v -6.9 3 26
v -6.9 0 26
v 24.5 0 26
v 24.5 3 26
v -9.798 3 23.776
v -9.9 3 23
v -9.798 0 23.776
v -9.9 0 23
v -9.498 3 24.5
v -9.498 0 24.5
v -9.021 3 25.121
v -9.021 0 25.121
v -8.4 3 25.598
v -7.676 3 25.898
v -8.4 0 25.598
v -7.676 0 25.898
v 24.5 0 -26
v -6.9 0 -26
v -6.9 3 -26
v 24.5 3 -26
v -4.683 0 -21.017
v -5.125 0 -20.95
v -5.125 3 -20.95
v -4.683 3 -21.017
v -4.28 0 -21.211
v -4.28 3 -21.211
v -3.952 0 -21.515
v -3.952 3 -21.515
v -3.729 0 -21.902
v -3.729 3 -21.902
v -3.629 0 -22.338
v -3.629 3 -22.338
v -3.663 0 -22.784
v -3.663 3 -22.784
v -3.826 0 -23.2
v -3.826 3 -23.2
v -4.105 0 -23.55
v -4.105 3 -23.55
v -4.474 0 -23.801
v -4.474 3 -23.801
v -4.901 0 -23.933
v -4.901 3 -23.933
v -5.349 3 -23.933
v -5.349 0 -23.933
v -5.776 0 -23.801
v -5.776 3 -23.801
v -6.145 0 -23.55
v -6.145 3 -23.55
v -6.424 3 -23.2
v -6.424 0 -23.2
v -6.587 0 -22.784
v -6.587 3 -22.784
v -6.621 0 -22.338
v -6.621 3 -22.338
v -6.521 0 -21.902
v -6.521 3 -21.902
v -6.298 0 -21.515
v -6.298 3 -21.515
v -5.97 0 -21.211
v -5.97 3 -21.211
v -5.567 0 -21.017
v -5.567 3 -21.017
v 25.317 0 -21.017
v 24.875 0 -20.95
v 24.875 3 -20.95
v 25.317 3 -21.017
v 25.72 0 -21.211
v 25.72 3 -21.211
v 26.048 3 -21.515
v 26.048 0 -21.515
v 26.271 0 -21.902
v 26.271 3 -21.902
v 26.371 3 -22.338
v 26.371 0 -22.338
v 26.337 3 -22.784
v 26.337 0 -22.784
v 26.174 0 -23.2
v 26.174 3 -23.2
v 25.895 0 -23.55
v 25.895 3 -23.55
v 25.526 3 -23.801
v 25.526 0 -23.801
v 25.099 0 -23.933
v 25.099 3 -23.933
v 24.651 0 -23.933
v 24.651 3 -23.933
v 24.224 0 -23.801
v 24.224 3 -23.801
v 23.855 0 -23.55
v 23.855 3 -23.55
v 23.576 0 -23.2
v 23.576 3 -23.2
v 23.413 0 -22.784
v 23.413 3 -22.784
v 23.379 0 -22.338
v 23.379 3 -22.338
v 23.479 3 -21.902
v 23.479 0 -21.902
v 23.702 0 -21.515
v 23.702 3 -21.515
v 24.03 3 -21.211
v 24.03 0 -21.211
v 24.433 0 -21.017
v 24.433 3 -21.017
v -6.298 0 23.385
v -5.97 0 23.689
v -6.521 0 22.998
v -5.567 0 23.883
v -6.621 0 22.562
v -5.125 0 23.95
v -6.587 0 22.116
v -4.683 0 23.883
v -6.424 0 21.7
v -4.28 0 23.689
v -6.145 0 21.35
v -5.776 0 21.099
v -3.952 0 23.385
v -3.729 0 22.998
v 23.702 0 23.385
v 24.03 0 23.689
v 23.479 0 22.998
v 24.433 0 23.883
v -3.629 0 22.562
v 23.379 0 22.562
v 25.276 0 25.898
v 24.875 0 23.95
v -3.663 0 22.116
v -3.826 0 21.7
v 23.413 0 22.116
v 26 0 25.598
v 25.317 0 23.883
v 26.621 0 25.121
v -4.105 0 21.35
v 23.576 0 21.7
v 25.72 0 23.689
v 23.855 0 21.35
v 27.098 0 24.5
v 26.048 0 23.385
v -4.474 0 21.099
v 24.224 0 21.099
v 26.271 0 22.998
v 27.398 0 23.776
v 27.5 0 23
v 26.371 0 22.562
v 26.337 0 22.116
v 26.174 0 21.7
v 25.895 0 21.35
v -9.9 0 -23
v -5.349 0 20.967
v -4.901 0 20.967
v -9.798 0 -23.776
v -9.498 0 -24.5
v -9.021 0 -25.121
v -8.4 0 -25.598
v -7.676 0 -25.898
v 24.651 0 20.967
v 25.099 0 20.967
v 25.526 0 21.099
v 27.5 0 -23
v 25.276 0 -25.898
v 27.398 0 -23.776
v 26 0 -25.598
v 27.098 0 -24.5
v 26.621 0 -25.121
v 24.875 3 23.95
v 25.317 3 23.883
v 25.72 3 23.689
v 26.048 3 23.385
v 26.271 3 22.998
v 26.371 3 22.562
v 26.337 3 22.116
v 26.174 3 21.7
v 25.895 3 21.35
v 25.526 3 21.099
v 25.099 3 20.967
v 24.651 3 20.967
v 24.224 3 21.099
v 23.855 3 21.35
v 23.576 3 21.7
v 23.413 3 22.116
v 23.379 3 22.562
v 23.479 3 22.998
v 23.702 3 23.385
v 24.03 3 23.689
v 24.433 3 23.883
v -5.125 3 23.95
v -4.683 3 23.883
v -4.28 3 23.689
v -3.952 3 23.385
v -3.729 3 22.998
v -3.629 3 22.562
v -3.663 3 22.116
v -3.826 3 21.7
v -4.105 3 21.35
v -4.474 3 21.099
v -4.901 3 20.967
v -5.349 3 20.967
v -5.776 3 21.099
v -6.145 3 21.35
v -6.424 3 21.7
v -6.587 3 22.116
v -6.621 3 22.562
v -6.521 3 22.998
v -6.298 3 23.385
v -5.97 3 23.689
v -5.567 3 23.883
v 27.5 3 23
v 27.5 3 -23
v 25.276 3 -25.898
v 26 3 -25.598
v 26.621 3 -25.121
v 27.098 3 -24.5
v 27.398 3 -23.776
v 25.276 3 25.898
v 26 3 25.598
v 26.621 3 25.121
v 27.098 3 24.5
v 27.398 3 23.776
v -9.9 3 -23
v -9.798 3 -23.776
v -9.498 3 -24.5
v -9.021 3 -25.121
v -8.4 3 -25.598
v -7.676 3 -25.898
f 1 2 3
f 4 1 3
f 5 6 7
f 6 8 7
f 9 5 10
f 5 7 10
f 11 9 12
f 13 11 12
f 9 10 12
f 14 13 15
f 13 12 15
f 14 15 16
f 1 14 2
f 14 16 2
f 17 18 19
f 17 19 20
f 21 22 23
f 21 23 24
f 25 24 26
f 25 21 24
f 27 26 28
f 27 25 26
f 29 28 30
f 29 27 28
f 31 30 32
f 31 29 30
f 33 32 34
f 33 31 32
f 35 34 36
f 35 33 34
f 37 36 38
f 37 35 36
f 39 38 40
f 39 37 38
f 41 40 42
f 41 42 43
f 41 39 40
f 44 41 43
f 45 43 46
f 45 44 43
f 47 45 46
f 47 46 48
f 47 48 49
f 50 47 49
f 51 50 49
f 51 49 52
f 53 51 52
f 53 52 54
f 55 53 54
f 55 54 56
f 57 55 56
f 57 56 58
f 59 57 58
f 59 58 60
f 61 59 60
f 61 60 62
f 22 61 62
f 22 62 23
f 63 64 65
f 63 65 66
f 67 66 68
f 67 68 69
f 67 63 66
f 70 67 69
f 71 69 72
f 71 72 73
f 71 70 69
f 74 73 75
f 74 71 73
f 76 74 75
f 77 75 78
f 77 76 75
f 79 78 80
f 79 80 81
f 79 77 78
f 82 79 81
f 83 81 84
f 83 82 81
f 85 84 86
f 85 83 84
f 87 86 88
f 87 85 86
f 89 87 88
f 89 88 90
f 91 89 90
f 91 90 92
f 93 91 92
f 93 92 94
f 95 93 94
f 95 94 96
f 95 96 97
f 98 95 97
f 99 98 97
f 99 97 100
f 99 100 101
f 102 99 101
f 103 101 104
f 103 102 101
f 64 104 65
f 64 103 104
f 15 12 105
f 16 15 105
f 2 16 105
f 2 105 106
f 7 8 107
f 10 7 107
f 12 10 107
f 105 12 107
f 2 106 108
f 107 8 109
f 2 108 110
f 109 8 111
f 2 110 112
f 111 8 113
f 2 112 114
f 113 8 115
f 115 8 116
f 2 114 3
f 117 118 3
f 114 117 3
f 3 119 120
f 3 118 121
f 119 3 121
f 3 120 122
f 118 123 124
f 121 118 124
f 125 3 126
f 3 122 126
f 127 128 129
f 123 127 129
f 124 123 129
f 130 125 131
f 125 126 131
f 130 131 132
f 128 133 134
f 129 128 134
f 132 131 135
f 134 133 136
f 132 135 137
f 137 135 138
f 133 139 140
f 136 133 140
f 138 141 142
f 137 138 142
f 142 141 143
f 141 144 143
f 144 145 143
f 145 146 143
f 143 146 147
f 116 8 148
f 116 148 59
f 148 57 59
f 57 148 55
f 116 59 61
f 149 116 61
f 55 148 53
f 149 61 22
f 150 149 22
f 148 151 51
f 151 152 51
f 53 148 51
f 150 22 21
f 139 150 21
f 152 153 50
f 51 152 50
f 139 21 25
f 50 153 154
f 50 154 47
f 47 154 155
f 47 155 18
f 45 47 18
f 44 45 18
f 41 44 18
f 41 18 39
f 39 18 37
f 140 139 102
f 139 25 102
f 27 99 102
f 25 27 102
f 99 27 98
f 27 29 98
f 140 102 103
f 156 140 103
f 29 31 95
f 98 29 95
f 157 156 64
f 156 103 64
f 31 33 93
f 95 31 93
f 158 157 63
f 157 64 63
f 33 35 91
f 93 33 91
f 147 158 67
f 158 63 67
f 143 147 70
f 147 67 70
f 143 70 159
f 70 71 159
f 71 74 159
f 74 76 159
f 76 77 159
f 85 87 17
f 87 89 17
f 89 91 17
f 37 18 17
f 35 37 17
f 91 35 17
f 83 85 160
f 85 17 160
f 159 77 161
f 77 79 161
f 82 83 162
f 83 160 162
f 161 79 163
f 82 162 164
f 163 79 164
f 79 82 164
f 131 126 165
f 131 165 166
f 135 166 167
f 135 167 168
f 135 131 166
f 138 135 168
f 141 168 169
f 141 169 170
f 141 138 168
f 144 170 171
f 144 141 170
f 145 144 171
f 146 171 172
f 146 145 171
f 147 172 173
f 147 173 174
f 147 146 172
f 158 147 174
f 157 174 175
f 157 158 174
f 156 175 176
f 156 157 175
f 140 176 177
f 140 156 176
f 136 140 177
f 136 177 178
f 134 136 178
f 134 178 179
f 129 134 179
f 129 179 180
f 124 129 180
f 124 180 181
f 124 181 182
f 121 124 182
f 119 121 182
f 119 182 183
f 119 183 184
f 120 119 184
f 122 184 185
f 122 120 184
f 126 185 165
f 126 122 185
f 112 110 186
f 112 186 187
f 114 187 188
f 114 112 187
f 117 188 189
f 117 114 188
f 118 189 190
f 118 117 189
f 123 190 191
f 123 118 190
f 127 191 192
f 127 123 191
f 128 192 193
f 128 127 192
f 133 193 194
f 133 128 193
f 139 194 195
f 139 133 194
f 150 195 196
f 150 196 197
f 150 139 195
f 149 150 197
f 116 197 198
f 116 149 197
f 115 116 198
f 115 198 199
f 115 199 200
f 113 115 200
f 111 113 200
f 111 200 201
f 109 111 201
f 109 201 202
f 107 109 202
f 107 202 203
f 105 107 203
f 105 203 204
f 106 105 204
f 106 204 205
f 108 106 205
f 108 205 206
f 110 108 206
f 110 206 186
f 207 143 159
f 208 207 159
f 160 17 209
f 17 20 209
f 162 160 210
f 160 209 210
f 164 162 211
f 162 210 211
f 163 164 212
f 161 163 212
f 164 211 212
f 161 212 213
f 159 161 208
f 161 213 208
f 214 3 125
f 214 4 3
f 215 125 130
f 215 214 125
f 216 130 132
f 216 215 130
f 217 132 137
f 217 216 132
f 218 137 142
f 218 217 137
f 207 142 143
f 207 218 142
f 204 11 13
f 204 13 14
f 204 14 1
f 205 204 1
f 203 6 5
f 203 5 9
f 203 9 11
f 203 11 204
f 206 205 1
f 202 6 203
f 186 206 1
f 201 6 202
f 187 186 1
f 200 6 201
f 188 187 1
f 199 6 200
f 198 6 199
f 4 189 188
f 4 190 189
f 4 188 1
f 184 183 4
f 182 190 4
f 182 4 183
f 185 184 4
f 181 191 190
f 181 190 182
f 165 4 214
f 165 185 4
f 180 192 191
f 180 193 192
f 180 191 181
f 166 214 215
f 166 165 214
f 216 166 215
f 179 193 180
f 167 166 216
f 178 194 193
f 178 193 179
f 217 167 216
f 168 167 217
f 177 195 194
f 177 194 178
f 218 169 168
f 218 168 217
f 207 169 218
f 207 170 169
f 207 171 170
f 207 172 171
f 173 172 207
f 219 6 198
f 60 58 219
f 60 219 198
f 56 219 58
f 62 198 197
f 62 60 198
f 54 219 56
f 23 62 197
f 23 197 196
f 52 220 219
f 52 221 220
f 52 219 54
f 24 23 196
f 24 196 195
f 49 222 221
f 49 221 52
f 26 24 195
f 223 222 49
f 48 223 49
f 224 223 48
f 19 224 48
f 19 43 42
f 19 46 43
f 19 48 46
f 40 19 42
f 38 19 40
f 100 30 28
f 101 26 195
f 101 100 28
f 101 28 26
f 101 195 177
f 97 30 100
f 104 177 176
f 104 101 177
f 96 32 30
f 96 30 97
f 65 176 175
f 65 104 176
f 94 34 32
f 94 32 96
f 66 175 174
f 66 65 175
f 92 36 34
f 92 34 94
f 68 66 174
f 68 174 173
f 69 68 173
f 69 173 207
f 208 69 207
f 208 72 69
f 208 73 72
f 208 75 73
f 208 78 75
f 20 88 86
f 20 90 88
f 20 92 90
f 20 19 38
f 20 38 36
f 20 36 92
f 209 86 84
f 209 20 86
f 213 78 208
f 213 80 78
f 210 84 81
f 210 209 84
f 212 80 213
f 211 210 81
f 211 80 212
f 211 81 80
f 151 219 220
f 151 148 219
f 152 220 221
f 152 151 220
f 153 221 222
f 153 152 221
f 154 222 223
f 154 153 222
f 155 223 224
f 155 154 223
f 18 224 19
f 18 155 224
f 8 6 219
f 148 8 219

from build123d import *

# Parameters (mm, degrees)
SKETCH2_W           = 65
SKETCH2_H           = 52
SKETCH2_R           = 1.5
BOSS_EXTRUDE1_DEPTH = 3
FILLET1_R           = 3
CUT_EXTRUDE1_START  = -10
SKETCH3_R           = 1.5
CUT_EXTRUDE1_DEPTH  = 10
SKETCH4_R           = 1.5
CUT_EXTRUDE2_DEPTH  = 10
FILLET2_R           = 3


with BuildPart() as part:
    # Sketch2 → Boss-Extrude1 (new body)
    with BuildSketch(Plane(origin=(0, 0, 0), x_dir=(1, 0, 0), z_dir=(0, 1, 0))):
        with Locations((-5, 0)):
            Rectangle(SKETCH2_W, SKETCH2_H)
        with Locations(Location((-24.875, 22.45, 0), (0, 0, 270))):
            Circle(SKETCH2_R, mode=Mode.SUBTRACT)
        with Locations(Location((24.875, 22.45, 0), (0, 0, 270))):
            Circle(SKETCH2_R, mode=Mode.SUBTRACT)
        with Locations(Location((24.875, -22.45, 0), (0, 0, 270))):
            Circle(SKETCH2_R, mode=Mode.SUBTRACT)
        with Locations(Location((-24.875, -22.45, 0), (0, 0, 270))):
            Circle(SKETCH2_R, mode=Mode.SUBTRACT)
    extrude(amount=BOSS_EXTRUDE1_DEPTH)

    # Fillet1
    fillet1_edges = [part.edges().sort_by_distance(p)[0] for p in [
        (-37.5, 1.5, 26),
        (-37.5, 1.5, -26),
        (27.5, 1.5, -26),
        (27.5, 1.5, 26),
    ]]
    fillet(fillet1_edges, radius=FILLET1_R)

    # Sketch3 → Cut-Extrude1 (cut)
    with BuildSketch(Plane(origin=(0, 3, 0), x_dir=(1, 0, 0), z_dir=(0, 1, 0)).offset(CUT_EXTRUDE1_START)):
        with Locations(Location((24.875, 22.45, 0), (0, 0, 270))):
            Circle(SKETCH3_R)
        with Locations(Location((-5.125, 22.45, 0), (0, 0, 270))):
            Circle(SKETCH3_R)
        with Locations(Location((-5.125, -22.45, 0), (0, 0, 270))):
            Circle(SKETCH3_R)
        with Locations(Location((24.875, -22.45, 0), (0, 0, 270))):
            Circle(SKETCH3_R)
    extrude(amount=CUT_EXTRUDE1_DEPTH, mode=Mode.SUBTRACT)

    # Sketch4 → Cut-Extrude2 (cut)
    with BuildSketch(Plane(origin=(0, 3, 0), x_dir=(1, 0, 0), z_dir=(0, 1, 0))):
        with BuildLine():
            Line((-9.9, -26), (-9.9, 0))
            Line((-9.9, 0), (-9.9, 26))
            Line((-9.9, 26), (-34.5, 26))
            ThreePointArc((-34.5, 26), (-36.621320344, 25.121320344), (-37.5, 23))
            Line((-37.5, 23), (-37.5, -23))
            ThreePointArc((-37.5, -23), (-36.621320344, -25.121320344), (-34.5, -26))
            Line((-34.5, -26), (-9.9, -26))
        make_face()
        with Locations((-24.875, -22.45)):
            Circle(SKETCH4_R, mode=Mode.SUBTRACT)
        with Locations((-24.875, 22.45)):
            Circle(SKETCH4_R, mode=Mode.SUBTRACT)
    extrude(amount=-CUT_EXTRUDE2_DEPTH, mode=Mode.SUBTRACT)

    # Fillet2
    fillet2_edges = [part.edges().sort_by_distance(p)[0] for p in [
        (-9.9, 1.5, -26),
        (-9.9, 1.5, 26),
    ]]
    fillet(fillet2_edges, radius=FILLET2_R)


solid = part.part
